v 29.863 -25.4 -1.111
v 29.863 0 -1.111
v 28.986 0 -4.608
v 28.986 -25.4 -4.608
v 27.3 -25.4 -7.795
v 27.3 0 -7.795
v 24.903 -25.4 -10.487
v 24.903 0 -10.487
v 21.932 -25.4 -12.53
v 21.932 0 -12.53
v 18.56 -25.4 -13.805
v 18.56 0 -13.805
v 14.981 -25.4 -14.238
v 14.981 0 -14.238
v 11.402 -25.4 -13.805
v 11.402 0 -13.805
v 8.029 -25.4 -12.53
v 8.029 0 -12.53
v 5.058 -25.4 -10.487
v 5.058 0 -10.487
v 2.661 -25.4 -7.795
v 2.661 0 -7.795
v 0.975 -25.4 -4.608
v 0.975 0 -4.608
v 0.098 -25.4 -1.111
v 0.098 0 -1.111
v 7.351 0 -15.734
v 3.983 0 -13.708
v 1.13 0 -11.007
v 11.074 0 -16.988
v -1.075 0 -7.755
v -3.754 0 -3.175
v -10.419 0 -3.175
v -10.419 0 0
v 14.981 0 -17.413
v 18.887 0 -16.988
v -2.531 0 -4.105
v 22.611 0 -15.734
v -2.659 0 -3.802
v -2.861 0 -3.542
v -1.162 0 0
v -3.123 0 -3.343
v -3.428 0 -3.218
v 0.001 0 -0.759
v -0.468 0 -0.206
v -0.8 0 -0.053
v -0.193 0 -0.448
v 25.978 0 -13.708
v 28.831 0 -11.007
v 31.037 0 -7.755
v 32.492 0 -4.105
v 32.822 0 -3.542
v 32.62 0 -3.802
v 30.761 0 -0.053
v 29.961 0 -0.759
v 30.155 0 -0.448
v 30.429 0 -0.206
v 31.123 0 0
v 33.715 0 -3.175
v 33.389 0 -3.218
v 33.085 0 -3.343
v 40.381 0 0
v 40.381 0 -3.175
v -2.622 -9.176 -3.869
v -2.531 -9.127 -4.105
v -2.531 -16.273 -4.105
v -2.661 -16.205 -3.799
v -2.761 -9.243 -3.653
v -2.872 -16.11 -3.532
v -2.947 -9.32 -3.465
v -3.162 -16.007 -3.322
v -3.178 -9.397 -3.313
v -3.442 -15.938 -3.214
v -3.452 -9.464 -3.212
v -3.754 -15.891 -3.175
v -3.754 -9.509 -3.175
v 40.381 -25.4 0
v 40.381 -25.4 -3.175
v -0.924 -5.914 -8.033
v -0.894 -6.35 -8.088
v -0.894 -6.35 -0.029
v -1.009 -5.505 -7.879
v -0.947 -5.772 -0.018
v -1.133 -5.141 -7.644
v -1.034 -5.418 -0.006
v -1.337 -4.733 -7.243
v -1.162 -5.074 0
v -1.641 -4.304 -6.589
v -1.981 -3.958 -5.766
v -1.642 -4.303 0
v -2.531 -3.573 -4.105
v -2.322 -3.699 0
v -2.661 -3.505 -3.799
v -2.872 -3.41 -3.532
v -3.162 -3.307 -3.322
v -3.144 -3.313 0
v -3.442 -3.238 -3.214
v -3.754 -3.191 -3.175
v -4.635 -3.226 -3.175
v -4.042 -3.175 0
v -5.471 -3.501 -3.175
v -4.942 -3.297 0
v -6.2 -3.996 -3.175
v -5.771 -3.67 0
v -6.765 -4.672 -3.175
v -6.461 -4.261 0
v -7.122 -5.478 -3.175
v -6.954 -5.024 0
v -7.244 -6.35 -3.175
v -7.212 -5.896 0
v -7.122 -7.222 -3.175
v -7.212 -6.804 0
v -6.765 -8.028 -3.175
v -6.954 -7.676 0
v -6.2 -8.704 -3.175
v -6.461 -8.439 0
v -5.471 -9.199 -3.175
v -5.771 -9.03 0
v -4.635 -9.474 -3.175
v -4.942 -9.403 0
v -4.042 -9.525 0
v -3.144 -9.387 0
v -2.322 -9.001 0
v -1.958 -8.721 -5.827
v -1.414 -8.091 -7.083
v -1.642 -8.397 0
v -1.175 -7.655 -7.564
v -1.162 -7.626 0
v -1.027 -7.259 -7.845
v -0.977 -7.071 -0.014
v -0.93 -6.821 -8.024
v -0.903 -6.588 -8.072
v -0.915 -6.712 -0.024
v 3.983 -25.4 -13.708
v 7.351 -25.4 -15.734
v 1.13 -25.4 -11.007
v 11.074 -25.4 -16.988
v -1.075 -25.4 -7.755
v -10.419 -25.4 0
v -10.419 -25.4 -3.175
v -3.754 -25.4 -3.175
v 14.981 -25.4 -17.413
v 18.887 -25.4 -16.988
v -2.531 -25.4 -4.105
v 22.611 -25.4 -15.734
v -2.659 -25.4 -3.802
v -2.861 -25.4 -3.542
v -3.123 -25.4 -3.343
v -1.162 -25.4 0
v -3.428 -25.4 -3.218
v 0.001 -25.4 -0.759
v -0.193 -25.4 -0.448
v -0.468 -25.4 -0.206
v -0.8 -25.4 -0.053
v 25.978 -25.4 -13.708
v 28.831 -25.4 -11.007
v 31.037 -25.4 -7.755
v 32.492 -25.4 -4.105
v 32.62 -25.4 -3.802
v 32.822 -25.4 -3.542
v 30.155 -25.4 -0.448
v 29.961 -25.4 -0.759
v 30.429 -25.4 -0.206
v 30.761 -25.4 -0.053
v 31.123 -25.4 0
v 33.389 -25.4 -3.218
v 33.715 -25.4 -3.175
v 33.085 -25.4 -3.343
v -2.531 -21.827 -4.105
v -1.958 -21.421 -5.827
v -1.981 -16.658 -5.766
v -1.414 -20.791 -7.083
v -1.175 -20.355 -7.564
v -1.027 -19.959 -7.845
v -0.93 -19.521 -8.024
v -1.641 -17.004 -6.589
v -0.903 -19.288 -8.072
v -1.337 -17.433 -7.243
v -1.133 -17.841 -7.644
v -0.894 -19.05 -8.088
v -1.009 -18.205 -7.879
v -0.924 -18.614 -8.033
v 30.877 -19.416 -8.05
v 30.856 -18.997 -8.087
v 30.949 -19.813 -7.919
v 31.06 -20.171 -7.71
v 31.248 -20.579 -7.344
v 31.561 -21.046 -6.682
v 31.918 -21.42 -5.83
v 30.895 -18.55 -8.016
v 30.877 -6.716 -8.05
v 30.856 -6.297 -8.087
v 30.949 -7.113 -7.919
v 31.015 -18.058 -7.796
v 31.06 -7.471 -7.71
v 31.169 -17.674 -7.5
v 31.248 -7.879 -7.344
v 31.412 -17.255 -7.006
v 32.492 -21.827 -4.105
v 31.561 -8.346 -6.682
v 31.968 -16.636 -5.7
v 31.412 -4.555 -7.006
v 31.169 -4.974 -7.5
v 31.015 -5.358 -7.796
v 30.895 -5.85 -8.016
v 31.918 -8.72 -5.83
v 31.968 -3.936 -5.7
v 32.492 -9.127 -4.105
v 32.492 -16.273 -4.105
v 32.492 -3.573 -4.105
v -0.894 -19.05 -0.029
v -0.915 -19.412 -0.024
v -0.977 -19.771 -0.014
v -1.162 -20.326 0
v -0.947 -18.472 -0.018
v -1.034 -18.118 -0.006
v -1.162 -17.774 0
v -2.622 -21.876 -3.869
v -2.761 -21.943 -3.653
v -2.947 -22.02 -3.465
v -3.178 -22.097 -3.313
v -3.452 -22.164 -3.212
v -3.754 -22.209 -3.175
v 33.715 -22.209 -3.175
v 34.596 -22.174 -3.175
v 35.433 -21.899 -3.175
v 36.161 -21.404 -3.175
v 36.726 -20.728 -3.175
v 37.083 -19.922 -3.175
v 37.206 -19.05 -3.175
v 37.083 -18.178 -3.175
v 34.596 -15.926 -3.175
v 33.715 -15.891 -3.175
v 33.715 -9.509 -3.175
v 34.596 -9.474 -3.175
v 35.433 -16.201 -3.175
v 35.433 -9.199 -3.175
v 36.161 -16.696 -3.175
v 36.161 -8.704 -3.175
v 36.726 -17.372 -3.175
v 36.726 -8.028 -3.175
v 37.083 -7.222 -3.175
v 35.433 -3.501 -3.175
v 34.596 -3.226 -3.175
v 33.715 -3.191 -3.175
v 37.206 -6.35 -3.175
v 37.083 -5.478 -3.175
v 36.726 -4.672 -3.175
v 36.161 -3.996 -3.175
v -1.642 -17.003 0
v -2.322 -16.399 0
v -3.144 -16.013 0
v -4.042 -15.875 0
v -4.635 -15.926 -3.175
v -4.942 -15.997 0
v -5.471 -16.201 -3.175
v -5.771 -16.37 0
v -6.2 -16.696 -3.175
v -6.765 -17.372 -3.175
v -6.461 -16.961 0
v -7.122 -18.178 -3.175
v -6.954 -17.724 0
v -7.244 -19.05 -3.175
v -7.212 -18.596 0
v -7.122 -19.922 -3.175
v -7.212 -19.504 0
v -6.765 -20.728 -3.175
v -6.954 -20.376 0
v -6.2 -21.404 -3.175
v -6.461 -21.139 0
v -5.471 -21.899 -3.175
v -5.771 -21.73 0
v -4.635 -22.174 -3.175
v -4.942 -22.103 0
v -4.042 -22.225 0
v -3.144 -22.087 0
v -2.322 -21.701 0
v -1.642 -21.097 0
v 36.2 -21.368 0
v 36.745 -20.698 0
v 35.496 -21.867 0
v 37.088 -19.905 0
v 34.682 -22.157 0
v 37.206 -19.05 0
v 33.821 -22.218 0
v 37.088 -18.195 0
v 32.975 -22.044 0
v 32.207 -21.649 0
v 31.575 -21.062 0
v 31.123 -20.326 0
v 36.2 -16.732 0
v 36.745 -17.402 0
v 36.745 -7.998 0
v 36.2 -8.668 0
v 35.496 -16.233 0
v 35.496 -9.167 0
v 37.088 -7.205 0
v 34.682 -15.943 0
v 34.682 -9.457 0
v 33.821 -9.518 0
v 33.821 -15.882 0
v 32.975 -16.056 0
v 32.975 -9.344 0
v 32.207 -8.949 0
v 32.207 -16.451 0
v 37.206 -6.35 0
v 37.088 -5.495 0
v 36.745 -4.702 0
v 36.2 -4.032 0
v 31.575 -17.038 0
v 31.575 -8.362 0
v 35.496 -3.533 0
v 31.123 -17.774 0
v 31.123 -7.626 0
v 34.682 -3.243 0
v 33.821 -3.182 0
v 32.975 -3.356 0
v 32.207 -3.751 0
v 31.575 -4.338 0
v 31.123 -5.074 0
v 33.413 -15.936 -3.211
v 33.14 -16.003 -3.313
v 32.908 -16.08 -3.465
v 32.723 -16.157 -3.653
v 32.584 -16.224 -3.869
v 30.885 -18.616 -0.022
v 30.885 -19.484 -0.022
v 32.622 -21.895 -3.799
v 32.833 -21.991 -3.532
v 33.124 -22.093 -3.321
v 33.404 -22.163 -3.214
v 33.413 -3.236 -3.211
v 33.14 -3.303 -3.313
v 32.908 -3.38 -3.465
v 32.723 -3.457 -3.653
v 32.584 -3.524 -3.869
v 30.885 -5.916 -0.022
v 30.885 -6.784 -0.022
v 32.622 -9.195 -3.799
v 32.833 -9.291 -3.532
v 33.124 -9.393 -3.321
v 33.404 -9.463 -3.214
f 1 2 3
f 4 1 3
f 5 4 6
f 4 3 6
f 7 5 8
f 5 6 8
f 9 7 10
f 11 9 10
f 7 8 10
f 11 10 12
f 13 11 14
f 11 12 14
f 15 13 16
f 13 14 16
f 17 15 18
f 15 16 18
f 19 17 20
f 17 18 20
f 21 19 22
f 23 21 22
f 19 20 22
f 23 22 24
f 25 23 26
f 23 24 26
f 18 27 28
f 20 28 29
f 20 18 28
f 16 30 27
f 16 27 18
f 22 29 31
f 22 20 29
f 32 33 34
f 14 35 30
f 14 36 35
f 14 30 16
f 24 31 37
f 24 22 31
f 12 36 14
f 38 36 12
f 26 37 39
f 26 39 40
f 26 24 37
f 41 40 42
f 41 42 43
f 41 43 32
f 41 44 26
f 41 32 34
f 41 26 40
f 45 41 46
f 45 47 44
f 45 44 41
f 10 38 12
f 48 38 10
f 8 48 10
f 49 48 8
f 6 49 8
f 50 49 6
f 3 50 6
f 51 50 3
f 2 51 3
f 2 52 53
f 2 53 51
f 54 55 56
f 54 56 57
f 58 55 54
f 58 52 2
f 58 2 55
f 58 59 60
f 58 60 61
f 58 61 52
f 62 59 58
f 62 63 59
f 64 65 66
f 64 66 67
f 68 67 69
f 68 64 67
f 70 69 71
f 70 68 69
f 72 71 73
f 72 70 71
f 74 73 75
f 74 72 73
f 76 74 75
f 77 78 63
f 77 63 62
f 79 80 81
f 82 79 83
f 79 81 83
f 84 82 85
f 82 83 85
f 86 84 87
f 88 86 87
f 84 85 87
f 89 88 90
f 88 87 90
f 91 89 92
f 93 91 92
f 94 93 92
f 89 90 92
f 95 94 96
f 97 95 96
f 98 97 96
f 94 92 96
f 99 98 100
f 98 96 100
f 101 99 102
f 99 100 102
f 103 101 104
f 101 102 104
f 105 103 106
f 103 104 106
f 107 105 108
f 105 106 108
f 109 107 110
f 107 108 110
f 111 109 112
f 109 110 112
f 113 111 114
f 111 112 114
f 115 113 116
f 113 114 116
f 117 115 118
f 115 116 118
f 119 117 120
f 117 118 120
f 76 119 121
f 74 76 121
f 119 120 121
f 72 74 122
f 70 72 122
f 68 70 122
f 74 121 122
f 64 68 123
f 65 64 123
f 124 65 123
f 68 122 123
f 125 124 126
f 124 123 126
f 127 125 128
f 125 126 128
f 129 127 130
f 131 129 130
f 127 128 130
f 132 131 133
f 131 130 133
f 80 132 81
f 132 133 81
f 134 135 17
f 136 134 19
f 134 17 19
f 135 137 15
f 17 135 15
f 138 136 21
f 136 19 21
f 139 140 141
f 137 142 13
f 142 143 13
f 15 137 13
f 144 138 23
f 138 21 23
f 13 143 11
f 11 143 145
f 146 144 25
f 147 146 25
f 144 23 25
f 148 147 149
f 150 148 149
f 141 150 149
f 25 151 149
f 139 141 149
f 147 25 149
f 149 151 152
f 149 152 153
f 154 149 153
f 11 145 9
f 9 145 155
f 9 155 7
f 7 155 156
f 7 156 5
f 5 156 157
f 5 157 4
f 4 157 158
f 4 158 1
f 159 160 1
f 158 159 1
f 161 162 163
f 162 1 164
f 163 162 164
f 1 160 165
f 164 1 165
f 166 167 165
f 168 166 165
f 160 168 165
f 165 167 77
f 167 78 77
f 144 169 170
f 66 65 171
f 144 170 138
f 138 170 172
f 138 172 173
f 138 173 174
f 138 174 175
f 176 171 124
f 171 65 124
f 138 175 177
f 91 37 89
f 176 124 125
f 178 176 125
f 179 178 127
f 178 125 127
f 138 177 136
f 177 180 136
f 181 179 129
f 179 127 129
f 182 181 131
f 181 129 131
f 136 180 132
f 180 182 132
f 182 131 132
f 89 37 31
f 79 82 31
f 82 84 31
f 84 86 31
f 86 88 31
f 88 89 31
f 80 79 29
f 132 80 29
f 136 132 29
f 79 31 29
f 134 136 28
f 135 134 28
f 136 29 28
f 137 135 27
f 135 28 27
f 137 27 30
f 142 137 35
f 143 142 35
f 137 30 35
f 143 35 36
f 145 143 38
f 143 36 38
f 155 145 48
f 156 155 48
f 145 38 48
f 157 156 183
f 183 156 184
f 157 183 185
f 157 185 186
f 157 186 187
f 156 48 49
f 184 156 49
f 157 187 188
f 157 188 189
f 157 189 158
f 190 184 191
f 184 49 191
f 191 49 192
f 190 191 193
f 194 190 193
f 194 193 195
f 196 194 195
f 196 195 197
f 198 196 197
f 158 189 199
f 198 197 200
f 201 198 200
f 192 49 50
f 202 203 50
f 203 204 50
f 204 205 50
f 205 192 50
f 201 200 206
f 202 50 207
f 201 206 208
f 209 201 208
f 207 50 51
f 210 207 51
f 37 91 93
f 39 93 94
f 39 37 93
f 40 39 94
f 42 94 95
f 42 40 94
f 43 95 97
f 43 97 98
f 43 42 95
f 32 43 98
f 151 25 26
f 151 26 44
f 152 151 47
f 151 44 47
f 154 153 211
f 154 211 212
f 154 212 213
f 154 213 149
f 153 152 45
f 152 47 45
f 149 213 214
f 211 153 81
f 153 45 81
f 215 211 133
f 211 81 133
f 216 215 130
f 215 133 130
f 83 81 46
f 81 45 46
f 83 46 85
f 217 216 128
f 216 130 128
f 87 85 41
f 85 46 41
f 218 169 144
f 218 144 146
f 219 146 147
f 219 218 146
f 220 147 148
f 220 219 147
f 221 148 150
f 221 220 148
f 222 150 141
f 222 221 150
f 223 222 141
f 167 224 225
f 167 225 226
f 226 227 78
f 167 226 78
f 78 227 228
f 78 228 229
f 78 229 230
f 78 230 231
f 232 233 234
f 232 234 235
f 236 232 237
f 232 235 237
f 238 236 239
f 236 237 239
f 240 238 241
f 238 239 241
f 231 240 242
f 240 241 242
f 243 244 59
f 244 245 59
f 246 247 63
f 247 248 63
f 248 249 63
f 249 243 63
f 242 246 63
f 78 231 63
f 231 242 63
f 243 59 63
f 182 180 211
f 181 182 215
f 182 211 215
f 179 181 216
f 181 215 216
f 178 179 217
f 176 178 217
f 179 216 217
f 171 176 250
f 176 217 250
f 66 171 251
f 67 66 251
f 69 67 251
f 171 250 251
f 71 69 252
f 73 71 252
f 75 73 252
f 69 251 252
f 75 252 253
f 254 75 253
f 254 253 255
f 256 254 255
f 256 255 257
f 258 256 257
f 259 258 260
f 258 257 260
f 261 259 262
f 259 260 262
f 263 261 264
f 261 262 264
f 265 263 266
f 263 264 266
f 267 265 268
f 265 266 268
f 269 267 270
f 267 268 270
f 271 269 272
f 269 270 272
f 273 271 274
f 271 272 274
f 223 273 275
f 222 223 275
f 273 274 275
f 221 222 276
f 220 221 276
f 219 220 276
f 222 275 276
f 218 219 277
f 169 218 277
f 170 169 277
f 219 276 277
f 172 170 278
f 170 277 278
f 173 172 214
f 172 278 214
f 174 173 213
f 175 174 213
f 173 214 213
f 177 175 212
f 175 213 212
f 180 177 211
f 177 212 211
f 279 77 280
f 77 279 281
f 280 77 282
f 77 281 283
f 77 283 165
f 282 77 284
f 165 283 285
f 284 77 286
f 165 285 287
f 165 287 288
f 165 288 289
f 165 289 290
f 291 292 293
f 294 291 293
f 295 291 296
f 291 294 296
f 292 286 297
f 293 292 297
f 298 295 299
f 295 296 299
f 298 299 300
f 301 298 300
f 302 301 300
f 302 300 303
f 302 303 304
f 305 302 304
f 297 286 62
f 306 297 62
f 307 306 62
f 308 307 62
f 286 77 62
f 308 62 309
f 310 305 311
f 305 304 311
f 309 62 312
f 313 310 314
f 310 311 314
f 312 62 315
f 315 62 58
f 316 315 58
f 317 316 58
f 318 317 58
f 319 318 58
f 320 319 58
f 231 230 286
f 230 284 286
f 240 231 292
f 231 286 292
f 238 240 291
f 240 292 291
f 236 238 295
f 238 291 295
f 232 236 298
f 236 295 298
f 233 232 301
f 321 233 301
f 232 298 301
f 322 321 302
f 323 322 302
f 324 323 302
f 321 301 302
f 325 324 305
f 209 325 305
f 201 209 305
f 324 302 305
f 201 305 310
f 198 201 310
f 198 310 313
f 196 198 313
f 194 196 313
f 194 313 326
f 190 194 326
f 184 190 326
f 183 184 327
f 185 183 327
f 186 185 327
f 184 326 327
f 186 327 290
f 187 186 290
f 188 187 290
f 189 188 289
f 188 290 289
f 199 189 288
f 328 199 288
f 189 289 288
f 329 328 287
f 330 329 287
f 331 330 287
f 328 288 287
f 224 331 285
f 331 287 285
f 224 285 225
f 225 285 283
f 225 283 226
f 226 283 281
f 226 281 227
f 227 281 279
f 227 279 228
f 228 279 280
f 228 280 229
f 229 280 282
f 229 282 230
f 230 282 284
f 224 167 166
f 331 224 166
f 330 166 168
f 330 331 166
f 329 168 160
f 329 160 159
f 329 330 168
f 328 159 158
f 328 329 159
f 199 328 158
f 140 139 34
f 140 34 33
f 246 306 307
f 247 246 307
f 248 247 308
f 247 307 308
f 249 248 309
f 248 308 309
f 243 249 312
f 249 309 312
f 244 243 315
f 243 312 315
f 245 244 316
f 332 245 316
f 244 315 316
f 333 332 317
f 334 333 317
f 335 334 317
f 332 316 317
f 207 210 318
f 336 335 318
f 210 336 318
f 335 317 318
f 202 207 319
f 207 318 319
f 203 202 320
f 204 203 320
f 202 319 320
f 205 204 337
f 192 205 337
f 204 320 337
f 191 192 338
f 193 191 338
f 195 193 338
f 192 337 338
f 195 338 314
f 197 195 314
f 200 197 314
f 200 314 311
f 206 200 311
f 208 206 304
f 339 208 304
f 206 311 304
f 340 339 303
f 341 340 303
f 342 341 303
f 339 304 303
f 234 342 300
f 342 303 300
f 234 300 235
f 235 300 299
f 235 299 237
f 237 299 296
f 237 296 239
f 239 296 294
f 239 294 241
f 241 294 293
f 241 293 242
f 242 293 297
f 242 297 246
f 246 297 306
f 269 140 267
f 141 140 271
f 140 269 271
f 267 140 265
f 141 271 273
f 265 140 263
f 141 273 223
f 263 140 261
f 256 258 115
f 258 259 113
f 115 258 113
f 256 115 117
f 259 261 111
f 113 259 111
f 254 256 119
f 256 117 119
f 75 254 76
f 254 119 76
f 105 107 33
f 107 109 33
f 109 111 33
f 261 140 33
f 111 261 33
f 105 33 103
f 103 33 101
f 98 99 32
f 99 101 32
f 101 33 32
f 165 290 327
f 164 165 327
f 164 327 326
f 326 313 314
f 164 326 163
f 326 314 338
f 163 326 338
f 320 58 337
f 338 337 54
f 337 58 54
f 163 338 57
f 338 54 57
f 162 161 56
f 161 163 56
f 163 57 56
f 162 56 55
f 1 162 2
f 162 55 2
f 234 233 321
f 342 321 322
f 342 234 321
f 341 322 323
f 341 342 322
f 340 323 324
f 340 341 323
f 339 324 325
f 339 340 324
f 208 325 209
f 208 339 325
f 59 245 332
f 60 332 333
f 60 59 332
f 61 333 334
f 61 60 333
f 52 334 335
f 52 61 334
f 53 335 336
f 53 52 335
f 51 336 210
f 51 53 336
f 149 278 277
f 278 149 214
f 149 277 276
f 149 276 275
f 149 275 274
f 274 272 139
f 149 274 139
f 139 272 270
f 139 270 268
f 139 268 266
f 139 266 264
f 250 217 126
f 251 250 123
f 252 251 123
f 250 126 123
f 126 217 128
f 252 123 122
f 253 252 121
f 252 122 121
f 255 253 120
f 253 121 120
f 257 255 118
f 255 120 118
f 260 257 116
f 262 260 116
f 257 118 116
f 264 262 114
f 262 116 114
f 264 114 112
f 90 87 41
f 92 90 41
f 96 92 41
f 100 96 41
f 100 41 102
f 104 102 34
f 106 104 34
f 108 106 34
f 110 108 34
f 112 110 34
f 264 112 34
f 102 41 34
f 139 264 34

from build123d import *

# Parameters (mm, degrees)
BOSS_EXTRUDE1_DEPTH = 25.4
SKETCH3_R           = 3.175
CUT_EXTRUDE1_DEPTH  = 51.78354129
FILLET1_R           = 1.27


with BuildPart() as part:
    # Sketch2 → Boss-Extrude1 (new body)
    with BuildSketch(Plane(origin=(0, 0, 0), x_dir=(1, 0, 0), z_dir=(0, 1, 0))):
        with BuildLine():
            Line((0, 0), (-10.419367303, 0))
            Line((-10.419367303, 0), (-10.419367303, 3.175))
            Line((-10.419367303, 3.175), (-2.762835284, 3.175))
            ThreePointArc((-2.762835284, 3.175), (14.980632697, 17.413), (32.724100678, 3.175))
            Line((32.724100678, 3.175), (40.380632697, 3.175))
            Line((40.380632697, 3.175), (40.380632697, 0))
            Line((40.380632697, 0), (29.961265394, 0))
            ThreePointArc((29.961265394, 0), (14.980632697, 14.238), (0, 0))
        make_face()
    extrude(amount=-BOSS_EXTRUDE1_DEPTH)

    # Sketch3 → Cut-Extrude1 (cut, through all)
    with BuildSketch(Plane.XY):
        with Locations((-4.069367303, -6.35)):
            Circle(SKETCH3_R)
        with Locations((34.030632697, -6.35)):
            Circle(SKETCH3_R)
        with Locations((-4.069367303, -19.05)):
            Circle(SKETCH3_R)
        with Locations((34.030632697, -19.05)):
            Circle(SKETCH3_R)
    extrude(amount=-CUT_EXTRUDE1_DEPTH, mode=Mode.SUBTRACT)

    # Fillet1
    # the kernel refuses this fillet: 1.27 mm, written as the material it adds along each edge
    with BuildSketch(Plane(origin=(32.724100678, 0, -3.175), x_dir=(1, 0, 0), z_dir=(0, -1, 0))) as fillet1_piece_1_section:
        with BuildLine():
            CenterArc((0.991397271, -1.27), FILLET1_R, 90, 74.467738735)
            ThreePointArc((-0.232222111, -0.929918231), (-0.109979978, -0.466490187), (0, 0))
            Line((0, 0), (0.991397271, 0))
        make_face()
    fillet1_piece_1 = extrude(amount=5.934776002, mode=Mode.PRIVATE)
    fillet1_piece_1 = fillet1_piece_1 - Plane(origin=(34.030632697, -6.35, -3.384746049), x_dir=(1, 0, 0), z_dir=(0, 0, 1)) * Cylinder(3.175, 16, mode=Mode.PRIVATE)
    add(fillet1_piece_1)
    with BuildSketch(Plane(origin=(32.724100678, -19.465223998, -3.175), x_dir=(1, 0, 0), z_dir=(0, -1, 0))) as fillet1_piece_2_section:
        with BuildLine():
            CenterArc((0.991397271, -1.27), FILLET1_R, 90, 74.467738735)
            ThreePointArc((-0.232222111, -0.929918231), (-0.109979978, -0.466490187), (0, 0))
            Line((0, 0), (0.991397271, 0))
        make_face()
    fillet1_piece_2 = extrude(amount=5.934776002, mode=Mode.PRIVATE)
    fillet1_piece_2 = fillet1_piece_2 - Plane(origin=(34.030632697, -19.05, -3.384746046), x_dir=(1, 0, 0), z_dir=(0, 0, 1)) * Cylinder(3.175, 16, mode=Mode.PRIVATE)
    add(fillet1_piece_2)
    with BuildSketch(Plane(origin=(32.724100678, -6.765223998, -3.175), x_dir=(1, 0, 0), z_dir=(0, -1, 0))) as fillet1_piece_3_section:
        with BuildLine():
            CenterArc((0.991397271, -1.27), FILLET1_R, 90, 74.467738735)
            ThreePointArc((-0.232222111, -0.929918231), (-0.109979978, -0.466490187), (0, 0))
            Line((0, 0), (0.991397271, 0))
        make_face()
    fillet1_piece_3 = extrude(amount=11.869552004, mode=Mode.PRIVATE)
    fillet1_piece_3 = fillet1_piece_3 - Plane(origin=(34.030632697, -19.05, -3.384746051), x_dir=(1, 0, 0), z_dir=(0, 0, 1)) * Cylinder(3.175, 28, mode=Mode.PRIVATE)
    fillet1_piece_3 = fillet1_piece_3 - Plane(origin=(34.030632697, -6.35, -3.384746051), x_dir=(1, 0, 0), z_dir=(0, 0, 1)) * Cylinder(3.175, 28, mode=Mode.PRIVATE)
    add(fillet1_piece_3)
    with BuildSketch(Plane(origin=(-2.762835284, 0, -3.175), x_dir=(0.24228281636804117, 0, -0.9702056673163532), z_dir=(0, -1, 0))) as fillet1_piece_4_section:
        with BuildLine():
            CenterArc((0.991962675, -1.269558427), FILLET1_R, 91.510947972, 74.467738735)
            Line((-0.240198523, -0.96185925), (0, 0))
            ThreePointArc((0, 0), (0.479237682, -0.006319359), (0.958475365, 0))
        make_face()
    fillet1_piece_4 = extrude(amount=5.934776002, mode=Mode.PRIVATE)
    fillet1_piece_4 = fillet1_piece_4 - Plane(origin=(-4.069367303, -6.35, -3.384746045), x_dir=(1, 0, 0), z_dir=(0, 0, 1)) * Cylinder(3.175, 16, mode=Mode.PRIVATE)
    add(fillet1_piece_4)
    with BuildSketch(Plane(origin=(-2.762835284, -19.465223998, -3.175), x_dir=(0.24228281636804025, 0, -0.9702056673163533), z_dir=(0, -1, 0))) as fillet1_piece_5_section:
        with BuildLine():
            CenterArc((0.991962675, -1.269558427), FILLET1_R, 91.510947972, 74.467738735)
            Line((-0.240198523, -0.96185925), (0, 0))
            ThreePointArc((0, 0), (0.479237682, -0.006319359), (0.958475365, 0))
        make_face()
    fillet1_piece_5 = extrude(amount=5.934776002, mode=Mode.PRIVATE)
    fillet1_piece_5 = fillet1_piece_5 - Plane(origin=(-4.069367303, -19.05, -3.384746049), x_dir=(1, 0, 0), z_dir=(0, 0, 1)) * Cylinder(3.175, 16, mode=Mode.PRIVATE)
    add(fillet1_piece_5)
    with BuildSketch(Plane(origin=(-2.762835284, -6.765223998, -3.175), x_dir=(0.24228281636804025, 0, -0.9702056673163533), z_dir=(0, -1, 0))) as fillet1_piece_6_section:
        with BuildLine():
            CenterArc((0.991962675, -1.269558427), FILLET1_R, 91.510947972, 74.467738735)
            Line((-0.240198523, -0.96185925), (0, 0))
            ThreePointArc((0, 0), (0.479237682, -0.006319359), (0.958475365, 0))
        make_face()
    fillet1_piece_6 = extrude(amount=11.869552004, mode=Mode.PRIVATE)
    fillet1_piece_6 = fillet1_piece_6 - Plane(origin=(-4.069367303, -19.05, -3.38474605), x_dir=(1, 0, 0), z_dir=(0, 0, 1)) * Cylinder(3.175, 28, mode=Mode.PRIVATE)
    fillet1_piece_6 = fillet1_piece_6 - Plane(origin=(-4.069367303, -6.35, -3.38474605), x_dir=(1, 0, 0), z_dir=(0, 0, 1)) * Cylinder(3.175, 28, mode=Mode.PRIVATE)
    add(fillet1_piece_6)
    # the kernel refuses this fillet: 1.27 mm, written as the material it takes off along each edge
    with BuildSketch(Plane(origin=(29.961265394, 2.904944682, 0), x_dir=(1, 0, 0), z_dir=(0, -1, 0))) as fillet1_2_piece_1:
        with BuildLine():
            CenterArc((1.161977873, -1.27), FILLET1_R, 90, 82.825455624)
            ThreePointArc((-0.098078392, -1.111386601), (-0.038702449, -0.556605505), (0, 0))
            Line((0, 0), (1.161977873, 0))
        make_face()
    extrude(amount=31.209889363, mode=Mode.SUBTRACT)
    with BuildSketch(Plane(origin=(0, 2.904944682, 0), x_dir=(0.08790703364755922, 0, -0.996128683170647), z_dir=(0, -1, 0))) as fillet1_2_piece_2:
        with BuildLine():
            CenterArc((1.1629374, -1.269121421), FILLET1_R, 92.131332721, 82.825455624)
            Line((-0.102146028, -1.157479488), (0, 0))
            ThreePointArc((0, 0), (0.557852926, -0.010376919), (1.115705852, 0))
        make_face()
    extrude(amount=31.209889363, mode=Mode.SUBTRACT)


solid = part.part
